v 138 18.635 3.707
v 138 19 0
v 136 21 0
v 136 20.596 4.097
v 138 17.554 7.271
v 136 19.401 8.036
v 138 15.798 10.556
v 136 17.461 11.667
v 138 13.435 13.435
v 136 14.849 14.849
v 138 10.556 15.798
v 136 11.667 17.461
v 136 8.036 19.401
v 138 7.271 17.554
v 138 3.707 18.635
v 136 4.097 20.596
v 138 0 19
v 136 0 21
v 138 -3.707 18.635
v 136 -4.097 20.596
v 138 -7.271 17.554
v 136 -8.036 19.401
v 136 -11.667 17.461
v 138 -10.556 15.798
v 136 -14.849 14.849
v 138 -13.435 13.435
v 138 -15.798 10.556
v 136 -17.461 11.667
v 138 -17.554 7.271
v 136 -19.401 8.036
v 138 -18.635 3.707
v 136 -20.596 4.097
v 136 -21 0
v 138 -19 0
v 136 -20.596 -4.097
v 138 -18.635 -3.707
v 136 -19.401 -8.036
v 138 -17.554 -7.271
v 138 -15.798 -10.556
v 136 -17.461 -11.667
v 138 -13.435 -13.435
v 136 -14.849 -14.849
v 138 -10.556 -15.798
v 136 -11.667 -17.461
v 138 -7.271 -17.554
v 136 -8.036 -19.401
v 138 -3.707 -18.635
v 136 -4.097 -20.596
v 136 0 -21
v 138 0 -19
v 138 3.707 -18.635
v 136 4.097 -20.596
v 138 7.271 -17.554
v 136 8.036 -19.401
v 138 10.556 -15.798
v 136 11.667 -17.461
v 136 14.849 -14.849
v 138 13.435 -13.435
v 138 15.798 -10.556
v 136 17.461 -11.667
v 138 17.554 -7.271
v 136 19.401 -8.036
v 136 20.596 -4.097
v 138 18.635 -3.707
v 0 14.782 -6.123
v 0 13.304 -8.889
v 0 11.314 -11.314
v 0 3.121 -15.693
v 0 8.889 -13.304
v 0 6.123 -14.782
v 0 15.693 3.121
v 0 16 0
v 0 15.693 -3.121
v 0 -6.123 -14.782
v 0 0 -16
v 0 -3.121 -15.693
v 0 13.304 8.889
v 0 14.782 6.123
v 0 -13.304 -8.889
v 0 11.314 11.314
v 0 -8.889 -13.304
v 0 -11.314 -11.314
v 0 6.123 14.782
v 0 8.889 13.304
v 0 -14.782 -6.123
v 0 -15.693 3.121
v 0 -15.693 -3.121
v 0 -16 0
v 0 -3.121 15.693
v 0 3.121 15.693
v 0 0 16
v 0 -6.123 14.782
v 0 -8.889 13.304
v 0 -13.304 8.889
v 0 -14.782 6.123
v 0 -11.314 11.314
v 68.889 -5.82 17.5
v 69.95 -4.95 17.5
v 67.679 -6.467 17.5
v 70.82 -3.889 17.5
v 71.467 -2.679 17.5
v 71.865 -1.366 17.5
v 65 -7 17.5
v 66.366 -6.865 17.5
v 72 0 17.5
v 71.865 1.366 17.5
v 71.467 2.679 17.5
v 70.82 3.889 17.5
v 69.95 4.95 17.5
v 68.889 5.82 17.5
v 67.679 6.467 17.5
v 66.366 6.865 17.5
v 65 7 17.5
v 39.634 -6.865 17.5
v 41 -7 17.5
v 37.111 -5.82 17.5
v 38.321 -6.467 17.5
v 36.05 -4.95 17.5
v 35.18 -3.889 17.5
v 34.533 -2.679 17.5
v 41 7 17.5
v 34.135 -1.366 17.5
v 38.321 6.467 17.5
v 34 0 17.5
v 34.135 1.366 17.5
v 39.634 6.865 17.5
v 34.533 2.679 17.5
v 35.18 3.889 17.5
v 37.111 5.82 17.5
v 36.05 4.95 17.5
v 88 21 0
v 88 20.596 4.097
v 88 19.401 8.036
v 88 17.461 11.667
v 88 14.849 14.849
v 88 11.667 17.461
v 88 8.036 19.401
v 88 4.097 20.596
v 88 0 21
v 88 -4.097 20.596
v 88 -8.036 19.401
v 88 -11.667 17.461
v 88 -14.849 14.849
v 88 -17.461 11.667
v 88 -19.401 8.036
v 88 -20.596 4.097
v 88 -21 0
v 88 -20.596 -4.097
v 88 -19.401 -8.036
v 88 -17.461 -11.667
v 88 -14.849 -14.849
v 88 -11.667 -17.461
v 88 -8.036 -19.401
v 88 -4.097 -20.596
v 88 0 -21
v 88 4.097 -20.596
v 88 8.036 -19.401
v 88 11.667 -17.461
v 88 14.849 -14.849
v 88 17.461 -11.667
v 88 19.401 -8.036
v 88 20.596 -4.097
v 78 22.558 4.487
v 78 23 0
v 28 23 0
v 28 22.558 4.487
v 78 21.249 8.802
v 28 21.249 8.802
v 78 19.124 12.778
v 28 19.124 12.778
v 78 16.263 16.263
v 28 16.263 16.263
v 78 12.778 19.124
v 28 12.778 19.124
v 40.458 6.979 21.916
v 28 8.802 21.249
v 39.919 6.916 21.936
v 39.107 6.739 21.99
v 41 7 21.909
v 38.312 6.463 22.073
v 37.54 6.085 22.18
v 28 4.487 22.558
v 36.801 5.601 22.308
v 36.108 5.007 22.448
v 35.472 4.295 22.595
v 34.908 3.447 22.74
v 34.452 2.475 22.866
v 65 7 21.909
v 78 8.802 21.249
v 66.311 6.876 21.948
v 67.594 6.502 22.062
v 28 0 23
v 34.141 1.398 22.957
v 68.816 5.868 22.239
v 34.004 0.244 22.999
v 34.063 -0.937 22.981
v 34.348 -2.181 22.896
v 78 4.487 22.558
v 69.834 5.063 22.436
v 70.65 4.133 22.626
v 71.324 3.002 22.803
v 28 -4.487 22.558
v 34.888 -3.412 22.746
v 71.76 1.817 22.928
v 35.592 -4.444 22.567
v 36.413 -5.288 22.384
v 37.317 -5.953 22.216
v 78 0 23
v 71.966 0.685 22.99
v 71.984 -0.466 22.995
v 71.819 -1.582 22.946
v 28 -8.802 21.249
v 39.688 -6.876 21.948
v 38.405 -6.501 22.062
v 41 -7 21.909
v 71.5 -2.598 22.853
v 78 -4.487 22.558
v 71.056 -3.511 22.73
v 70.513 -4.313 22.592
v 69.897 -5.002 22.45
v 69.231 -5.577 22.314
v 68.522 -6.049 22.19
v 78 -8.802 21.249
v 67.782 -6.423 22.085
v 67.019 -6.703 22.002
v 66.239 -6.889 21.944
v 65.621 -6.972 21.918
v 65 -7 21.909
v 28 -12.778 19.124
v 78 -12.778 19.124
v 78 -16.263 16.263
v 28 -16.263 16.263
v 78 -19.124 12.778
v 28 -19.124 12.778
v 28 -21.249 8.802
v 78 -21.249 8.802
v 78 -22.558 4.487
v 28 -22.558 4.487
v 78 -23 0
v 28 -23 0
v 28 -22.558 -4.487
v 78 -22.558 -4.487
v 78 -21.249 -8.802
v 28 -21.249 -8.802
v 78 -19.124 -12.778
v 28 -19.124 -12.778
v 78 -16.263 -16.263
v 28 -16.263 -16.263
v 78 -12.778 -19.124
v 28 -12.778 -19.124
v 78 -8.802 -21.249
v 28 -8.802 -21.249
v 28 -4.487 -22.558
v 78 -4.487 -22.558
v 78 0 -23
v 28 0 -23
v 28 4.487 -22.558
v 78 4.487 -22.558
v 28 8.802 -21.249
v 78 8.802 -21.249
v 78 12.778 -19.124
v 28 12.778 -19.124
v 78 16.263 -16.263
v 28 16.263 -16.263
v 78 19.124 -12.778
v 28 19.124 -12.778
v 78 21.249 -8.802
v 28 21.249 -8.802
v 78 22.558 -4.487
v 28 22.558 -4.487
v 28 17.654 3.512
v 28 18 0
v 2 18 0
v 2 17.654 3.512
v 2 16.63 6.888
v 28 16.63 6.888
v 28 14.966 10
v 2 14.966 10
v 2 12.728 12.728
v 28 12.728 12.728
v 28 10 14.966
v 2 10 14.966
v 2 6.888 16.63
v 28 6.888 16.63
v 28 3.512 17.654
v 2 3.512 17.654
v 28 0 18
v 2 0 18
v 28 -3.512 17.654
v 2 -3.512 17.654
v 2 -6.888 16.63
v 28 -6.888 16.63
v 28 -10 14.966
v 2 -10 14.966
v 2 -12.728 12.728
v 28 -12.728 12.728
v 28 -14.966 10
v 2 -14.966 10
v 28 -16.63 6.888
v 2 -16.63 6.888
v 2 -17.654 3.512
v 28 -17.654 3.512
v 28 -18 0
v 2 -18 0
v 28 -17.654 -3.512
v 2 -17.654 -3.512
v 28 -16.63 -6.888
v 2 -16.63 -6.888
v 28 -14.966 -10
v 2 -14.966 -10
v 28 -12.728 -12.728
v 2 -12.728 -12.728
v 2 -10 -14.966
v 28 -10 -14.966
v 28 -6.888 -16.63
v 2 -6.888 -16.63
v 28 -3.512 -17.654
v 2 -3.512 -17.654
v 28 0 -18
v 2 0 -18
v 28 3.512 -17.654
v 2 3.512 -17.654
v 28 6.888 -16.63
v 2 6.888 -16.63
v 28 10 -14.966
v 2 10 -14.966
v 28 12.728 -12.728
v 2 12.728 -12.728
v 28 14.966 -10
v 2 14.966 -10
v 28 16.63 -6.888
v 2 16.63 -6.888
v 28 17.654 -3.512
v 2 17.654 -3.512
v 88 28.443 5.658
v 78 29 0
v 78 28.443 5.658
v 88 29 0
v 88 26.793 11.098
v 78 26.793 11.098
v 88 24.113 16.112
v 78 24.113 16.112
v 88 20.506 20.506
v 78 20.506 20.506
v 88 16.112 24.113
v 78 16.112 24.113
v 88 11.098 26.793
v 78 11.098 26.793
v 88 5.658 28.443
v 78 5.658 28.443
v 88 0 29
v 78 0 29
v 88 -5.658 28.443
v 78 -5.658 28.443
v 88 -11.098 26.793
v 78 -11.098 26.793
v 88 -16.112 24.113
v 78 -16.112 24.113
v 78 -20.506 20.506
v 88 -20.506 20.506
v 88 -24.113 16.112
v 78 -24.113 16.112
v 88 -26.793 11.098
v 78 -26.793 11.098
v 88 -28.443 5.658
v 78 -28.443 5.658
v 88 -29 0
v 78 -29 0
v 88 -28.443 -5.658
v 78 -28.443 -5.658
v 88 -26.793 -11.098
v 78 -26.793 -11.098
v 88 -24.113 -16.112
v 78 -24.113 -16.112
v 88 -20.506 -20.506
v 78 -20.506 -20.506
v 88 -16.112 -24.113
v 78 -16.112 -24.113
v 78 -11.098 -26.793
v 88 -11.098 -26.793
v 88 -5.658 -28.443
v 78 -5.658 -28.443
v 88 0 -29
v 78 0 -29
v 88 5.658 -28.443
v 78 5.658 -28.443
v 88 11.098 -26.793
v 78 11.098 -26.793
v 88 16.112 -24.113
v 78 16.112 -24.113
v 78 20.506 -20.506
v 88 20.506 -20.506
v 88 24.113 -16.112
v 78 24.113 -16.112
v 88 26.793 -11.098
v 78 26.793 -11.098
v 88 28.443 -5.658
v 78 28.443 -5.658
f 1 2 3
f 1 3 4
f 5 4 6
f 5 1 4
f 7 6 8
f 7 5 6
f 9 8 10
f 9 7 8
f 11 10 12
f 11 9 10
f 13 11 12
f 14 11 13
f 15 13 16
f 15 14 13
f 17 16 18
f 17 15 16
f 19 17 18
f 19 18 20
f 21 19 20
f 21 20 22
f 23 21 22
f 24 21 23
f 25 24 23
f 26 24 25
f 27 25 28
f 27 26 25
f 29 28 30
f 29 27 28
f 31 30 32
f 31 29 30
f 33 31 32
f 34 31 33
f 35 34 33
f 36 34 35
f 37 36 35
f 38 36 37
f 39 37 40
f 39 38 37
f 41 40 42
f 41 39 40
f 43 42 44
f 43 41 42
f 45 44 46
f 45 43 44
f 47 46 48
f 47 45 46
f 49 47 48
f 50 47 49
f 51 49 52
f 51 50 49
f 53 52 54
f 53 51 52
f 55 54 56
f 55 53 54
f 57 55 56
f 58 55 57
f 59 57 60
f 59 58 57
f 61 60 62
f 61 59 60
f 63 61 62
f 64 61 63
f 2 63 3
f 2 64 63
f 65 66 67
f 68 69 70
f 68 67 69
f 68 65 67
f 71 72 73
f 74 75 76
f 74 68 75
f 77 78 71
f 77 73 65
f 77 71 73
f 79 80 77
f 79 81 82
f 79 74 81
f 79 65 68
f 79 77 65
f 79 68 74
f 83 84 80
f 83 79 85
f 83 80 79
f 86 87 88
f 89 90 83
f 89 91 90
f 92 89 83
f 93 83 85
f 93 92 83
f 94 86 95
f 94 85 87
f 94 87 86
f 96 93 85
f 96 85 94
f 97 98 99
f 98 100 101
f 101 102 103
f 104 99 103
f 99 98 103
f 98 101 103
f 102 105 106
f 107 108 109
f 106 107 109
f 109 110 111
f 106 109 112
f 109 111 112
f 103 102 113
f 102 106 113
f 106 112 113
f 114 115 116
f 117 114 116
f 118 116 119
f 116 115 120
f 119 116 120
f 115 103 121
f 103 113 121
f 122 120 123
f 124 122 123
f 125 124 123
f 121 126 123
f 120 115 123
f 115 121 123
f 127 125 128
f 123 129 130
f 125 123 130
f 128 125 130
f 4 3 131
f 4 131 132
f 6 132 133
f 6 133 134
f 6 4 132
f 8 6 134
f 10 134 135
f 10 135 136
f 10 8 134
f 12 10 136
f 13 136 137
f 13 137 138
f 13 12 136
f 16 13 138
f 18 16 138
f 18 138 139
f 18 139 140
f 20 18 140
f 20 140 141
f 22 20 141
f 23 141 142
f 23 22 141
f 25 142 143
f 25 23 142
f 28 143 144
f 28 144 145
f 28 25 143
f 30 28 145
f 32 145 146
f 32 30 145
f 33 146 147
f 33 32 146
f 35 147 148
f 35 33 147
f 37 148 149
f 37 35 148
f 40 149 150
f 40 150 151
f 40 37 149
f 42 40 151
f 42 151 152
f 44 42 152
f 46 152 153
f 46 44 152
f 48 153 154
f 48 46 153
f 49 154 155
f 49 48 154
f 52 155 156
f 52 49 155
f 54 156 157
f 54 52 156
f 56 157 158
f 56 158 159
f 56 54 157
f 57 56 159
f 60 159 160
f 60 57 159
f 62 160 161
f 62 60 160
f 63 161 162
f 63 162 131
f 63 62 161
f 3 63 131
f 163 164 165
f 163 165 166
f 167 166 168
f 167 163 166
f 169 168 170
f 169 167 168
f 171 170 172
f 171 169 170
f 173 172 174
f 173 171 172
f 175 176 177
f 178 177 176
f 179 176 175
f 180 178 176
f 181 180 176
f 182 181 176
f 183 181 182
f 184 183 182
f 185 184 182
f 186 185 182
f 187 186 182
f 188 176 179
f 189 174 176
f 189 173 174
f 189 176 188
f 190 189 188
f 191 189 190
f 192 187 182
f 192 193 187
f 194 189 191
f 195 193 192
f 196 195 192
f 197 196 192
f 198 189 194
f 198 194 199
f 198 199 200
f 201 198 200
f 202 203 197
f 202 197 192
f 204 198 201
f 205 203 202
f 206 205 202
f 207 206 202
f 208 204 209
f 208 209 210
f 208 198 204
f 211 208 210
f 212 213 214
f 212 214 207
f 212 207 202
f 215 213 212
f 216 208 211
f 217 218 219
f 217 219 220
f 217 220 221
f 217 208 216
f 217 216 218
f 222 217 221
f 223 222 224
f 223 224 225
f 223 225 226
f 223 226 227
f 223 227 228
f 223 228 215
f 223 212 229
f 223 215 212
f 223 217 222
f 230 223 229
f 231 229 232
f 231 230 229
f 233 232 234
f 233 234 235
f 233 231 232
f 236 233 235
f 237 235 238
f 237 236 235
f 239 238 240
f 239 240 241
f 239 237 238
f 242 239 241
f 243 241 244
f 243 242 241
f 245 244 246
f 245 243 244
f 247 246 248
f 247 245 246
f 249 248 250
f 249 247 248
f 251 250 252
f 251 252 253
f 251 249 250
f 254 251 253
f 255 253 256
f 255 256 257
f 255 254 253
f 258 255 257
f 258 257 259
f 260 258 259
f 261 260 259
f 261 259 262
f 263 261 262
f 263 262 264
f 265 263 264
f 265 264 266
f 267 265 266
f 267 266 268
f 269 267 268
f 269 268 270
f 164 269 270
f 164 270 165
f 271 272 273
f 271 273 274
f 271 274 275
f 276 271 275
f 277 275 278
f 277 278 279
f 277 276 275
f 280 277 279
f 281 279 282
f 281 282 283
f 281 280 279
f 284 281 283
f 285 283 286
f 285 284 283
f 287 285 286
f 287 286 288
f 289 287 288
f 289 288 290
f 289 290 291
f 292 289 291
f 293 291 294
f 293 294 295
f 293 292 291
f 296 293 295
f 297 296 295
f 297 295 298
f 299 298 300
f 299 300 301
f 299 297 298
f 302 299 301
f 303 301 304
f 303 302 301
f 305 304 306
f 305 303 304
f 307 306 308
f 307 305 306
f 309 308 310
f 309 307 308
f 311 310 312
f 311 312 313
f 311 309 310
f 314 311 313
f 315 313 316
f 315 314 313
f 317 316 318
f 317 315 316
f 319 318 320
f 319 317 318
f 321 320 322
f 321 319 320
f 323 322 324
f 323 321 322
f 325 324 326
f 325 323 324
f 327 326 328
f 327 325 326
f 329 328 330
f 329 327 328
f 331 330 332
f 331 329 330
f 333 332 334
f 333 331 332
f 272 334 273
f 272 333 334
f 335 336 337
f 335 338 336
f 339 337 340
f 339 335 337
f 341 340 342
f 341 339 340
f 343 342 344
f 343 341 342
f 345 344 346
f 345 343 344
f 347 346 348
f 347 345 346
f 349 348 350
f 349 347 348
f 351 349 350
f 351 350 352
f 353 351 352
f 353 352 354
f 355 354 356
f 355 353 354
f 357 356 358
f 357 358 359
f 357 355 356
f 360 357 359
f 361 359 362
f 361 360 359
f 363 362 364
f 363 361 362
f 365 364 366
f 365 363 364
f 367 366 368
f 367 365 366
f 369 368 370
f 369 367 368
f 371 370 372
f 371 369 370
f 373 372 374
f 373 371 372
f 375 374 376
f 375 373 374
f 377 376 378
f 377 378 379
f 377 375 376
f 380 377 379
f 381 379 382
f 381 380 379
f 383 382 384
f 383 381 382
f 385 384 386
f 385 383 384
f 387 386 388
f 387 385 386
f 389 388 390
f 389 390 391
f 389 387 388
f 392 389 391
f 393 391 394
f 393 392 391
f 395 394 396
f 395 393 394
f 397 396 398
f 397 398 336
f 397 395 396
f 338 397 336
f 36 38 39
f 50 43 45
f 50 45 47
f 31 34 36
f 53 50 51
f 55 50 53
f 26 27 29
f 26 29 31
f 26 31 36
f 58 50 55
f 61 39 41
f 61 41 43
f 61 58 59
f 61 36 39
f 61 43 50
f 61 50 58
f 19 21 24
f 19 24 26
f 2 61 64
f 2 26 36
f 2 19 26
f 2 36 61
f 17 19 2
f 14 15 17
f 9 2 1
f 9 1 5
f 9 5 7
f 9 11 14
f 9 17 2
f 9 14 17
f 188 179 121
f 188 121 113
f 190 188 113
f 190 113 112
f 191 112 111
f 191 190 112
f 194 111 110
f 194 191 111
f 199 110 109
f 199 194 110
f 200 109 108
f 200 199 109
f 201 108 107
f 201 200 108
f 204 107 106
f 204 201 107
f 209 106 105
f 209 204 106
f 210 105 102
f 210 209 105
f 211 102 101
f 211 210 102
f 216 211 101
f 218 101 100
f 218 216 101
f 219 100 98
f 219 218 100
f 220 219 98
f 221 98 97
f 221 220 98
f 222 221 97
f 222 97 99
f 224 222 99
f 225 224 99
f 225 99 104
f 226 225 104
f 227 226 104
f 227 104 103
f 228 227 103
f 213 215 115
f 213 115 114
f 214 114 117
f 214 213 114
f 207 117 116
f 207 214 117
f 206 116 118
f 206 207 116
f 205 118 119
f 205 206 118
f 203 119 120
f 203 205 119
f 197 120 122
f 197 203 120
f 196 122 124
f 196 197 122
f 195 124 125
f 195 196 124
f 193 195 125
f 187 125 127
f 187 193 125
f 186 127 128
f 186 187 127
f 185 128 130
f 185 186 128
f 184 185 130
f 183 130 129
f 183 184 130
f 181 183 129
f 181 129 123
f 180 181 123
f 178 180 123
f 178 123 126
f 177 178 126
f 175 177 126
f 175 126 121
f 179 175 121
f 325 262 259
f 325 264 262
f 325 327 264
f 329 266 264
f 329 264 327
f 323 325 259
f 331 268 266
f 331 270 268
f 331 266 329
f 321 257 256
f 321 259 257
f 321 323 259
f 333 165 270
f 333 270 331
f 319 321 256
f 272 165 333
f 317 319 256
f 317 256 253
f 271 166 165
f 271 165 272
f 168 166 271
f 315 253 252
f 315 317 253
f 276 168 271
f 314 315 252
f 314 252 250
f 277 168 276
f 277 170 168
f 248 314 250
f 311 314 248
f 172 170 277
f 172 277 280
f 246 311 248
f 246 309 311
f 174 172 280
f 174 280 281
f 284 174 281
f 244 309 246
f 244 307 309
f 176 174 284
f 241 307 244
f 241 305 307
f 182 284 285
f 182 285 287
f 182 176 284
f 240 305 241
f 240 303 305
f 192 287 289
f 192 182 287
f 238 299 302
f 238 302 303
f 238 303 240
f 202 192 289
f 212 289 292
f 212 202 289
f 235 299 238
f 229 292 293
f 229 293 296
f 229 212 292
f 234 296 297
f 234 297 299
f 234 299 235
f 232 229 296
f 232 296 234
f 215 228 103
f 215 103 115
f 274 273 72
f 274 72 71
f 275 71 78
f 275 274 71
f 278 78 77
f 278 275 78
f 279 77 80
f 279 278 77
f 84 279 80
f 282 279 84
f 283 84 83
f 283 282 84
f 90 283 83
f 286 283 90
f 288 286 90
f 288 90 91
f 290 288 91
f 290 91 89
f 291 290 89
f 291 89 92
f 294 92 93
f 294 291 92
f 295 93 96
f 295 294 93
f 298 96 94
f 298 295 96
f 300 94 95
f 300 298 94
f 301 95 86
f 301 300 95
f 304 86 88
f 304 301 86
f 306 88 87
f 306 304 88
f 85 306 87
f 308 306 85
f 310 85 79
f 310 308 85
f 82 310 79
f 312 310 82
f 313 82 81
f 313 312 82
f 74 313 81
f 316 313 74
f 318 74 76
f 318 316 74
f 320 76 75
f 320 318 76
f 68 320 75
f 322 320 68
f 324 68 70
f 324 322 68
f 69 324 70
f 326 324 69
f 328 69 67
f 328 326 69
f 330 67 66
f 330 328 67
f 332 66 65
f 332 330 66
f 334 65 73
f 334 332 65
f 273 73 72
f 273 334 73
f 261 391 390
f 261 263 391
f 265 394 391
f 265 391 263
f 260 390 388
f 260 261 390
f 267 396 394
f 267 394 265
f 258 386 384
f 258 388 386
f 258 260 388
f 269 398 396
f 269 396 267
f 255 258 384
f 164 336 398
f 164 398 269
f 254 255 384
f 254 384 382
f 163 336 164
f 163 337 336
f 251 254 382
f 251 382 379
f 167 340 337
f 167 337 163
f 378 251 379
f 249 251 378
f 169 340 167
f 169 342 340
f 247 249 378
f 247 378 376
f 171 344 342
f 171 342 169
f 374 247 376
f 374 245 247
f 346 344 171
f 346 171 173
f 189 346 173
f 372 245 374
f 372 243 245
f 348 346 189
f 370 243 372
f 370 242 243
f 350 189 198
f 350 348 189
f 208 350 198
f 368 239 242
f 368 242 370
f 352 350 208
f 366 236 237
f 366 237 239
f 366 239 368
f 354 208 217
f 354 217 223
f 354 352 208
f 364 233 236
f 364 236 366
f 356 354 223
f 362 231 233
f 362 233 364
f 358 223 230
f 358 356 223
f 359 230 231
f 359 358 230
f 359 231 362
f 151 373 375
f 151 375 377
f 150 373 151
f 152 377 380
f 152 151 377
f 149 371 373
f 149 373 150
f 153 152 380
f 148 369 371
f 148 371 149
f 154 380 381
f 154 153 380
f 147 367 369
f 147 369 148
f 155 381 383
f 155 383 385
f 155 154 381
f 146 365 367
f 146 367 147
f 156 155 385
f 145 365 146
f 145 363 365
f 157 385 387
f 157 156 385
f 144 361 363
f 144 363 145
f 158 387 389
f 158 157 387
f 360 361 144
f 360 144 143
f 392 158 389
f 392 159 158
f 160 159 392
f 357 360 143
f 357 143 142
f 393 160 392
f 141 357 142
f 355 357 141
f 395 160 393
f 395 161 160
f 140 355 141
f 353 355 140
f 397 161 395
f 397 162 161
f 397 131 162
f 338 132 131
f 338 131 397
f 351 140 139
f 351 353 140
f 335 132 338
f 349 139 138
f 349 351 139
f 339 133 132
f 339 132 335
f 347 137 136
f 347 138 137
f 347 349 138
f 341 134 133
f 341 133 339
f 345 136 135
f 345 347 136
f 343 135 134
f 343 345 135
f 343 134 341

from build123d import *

# Parameters (mm, degrees)
CUT_EXTRUDE1_DEPTH = 5.5
CHAMFER2_SIZE      = 2


with BuildPart() as part:
    # Sketch1 → Revolve1 (revolve)
    with BuildSketch(Plane.XY):
        Polygon((0, 0), (0, 18), (28, 18), (28, 23), (78, 23), (78, 29), (88, 29), (88, 21), (138, 21), (138, 0), align=None)
    revolve(axis=Axis((0, 0, 0), (1, 0, 0)))

    # Sketch2 → Cut-Extrude1 (cut)
    with BuildSketch(Plane.XY.offset(23)):
        with BuildLine():
            Line((41, 7), (65, 7))
            ThreePointArc((65, 7), (72, 0), (65, -7))
            Line((65, -7), (41, -7))
            ThreePointArc((41, -7), (34, 0), (41, 7))
        make_face()
    extrude(amount=-CUT_EXTRUDE1_DEPTH, mode=Mode.SUBTRACT)

    # Chamfer2
    chamfer2_edges = [part.edges().sort_by_distance(p)[0] for p in [
        (0, -18, 0),
        (138, -21, 0),
    ]]
    chamfer(chamfer2_edges, length=CHAMFER2_SIZE)


solid = part.part
